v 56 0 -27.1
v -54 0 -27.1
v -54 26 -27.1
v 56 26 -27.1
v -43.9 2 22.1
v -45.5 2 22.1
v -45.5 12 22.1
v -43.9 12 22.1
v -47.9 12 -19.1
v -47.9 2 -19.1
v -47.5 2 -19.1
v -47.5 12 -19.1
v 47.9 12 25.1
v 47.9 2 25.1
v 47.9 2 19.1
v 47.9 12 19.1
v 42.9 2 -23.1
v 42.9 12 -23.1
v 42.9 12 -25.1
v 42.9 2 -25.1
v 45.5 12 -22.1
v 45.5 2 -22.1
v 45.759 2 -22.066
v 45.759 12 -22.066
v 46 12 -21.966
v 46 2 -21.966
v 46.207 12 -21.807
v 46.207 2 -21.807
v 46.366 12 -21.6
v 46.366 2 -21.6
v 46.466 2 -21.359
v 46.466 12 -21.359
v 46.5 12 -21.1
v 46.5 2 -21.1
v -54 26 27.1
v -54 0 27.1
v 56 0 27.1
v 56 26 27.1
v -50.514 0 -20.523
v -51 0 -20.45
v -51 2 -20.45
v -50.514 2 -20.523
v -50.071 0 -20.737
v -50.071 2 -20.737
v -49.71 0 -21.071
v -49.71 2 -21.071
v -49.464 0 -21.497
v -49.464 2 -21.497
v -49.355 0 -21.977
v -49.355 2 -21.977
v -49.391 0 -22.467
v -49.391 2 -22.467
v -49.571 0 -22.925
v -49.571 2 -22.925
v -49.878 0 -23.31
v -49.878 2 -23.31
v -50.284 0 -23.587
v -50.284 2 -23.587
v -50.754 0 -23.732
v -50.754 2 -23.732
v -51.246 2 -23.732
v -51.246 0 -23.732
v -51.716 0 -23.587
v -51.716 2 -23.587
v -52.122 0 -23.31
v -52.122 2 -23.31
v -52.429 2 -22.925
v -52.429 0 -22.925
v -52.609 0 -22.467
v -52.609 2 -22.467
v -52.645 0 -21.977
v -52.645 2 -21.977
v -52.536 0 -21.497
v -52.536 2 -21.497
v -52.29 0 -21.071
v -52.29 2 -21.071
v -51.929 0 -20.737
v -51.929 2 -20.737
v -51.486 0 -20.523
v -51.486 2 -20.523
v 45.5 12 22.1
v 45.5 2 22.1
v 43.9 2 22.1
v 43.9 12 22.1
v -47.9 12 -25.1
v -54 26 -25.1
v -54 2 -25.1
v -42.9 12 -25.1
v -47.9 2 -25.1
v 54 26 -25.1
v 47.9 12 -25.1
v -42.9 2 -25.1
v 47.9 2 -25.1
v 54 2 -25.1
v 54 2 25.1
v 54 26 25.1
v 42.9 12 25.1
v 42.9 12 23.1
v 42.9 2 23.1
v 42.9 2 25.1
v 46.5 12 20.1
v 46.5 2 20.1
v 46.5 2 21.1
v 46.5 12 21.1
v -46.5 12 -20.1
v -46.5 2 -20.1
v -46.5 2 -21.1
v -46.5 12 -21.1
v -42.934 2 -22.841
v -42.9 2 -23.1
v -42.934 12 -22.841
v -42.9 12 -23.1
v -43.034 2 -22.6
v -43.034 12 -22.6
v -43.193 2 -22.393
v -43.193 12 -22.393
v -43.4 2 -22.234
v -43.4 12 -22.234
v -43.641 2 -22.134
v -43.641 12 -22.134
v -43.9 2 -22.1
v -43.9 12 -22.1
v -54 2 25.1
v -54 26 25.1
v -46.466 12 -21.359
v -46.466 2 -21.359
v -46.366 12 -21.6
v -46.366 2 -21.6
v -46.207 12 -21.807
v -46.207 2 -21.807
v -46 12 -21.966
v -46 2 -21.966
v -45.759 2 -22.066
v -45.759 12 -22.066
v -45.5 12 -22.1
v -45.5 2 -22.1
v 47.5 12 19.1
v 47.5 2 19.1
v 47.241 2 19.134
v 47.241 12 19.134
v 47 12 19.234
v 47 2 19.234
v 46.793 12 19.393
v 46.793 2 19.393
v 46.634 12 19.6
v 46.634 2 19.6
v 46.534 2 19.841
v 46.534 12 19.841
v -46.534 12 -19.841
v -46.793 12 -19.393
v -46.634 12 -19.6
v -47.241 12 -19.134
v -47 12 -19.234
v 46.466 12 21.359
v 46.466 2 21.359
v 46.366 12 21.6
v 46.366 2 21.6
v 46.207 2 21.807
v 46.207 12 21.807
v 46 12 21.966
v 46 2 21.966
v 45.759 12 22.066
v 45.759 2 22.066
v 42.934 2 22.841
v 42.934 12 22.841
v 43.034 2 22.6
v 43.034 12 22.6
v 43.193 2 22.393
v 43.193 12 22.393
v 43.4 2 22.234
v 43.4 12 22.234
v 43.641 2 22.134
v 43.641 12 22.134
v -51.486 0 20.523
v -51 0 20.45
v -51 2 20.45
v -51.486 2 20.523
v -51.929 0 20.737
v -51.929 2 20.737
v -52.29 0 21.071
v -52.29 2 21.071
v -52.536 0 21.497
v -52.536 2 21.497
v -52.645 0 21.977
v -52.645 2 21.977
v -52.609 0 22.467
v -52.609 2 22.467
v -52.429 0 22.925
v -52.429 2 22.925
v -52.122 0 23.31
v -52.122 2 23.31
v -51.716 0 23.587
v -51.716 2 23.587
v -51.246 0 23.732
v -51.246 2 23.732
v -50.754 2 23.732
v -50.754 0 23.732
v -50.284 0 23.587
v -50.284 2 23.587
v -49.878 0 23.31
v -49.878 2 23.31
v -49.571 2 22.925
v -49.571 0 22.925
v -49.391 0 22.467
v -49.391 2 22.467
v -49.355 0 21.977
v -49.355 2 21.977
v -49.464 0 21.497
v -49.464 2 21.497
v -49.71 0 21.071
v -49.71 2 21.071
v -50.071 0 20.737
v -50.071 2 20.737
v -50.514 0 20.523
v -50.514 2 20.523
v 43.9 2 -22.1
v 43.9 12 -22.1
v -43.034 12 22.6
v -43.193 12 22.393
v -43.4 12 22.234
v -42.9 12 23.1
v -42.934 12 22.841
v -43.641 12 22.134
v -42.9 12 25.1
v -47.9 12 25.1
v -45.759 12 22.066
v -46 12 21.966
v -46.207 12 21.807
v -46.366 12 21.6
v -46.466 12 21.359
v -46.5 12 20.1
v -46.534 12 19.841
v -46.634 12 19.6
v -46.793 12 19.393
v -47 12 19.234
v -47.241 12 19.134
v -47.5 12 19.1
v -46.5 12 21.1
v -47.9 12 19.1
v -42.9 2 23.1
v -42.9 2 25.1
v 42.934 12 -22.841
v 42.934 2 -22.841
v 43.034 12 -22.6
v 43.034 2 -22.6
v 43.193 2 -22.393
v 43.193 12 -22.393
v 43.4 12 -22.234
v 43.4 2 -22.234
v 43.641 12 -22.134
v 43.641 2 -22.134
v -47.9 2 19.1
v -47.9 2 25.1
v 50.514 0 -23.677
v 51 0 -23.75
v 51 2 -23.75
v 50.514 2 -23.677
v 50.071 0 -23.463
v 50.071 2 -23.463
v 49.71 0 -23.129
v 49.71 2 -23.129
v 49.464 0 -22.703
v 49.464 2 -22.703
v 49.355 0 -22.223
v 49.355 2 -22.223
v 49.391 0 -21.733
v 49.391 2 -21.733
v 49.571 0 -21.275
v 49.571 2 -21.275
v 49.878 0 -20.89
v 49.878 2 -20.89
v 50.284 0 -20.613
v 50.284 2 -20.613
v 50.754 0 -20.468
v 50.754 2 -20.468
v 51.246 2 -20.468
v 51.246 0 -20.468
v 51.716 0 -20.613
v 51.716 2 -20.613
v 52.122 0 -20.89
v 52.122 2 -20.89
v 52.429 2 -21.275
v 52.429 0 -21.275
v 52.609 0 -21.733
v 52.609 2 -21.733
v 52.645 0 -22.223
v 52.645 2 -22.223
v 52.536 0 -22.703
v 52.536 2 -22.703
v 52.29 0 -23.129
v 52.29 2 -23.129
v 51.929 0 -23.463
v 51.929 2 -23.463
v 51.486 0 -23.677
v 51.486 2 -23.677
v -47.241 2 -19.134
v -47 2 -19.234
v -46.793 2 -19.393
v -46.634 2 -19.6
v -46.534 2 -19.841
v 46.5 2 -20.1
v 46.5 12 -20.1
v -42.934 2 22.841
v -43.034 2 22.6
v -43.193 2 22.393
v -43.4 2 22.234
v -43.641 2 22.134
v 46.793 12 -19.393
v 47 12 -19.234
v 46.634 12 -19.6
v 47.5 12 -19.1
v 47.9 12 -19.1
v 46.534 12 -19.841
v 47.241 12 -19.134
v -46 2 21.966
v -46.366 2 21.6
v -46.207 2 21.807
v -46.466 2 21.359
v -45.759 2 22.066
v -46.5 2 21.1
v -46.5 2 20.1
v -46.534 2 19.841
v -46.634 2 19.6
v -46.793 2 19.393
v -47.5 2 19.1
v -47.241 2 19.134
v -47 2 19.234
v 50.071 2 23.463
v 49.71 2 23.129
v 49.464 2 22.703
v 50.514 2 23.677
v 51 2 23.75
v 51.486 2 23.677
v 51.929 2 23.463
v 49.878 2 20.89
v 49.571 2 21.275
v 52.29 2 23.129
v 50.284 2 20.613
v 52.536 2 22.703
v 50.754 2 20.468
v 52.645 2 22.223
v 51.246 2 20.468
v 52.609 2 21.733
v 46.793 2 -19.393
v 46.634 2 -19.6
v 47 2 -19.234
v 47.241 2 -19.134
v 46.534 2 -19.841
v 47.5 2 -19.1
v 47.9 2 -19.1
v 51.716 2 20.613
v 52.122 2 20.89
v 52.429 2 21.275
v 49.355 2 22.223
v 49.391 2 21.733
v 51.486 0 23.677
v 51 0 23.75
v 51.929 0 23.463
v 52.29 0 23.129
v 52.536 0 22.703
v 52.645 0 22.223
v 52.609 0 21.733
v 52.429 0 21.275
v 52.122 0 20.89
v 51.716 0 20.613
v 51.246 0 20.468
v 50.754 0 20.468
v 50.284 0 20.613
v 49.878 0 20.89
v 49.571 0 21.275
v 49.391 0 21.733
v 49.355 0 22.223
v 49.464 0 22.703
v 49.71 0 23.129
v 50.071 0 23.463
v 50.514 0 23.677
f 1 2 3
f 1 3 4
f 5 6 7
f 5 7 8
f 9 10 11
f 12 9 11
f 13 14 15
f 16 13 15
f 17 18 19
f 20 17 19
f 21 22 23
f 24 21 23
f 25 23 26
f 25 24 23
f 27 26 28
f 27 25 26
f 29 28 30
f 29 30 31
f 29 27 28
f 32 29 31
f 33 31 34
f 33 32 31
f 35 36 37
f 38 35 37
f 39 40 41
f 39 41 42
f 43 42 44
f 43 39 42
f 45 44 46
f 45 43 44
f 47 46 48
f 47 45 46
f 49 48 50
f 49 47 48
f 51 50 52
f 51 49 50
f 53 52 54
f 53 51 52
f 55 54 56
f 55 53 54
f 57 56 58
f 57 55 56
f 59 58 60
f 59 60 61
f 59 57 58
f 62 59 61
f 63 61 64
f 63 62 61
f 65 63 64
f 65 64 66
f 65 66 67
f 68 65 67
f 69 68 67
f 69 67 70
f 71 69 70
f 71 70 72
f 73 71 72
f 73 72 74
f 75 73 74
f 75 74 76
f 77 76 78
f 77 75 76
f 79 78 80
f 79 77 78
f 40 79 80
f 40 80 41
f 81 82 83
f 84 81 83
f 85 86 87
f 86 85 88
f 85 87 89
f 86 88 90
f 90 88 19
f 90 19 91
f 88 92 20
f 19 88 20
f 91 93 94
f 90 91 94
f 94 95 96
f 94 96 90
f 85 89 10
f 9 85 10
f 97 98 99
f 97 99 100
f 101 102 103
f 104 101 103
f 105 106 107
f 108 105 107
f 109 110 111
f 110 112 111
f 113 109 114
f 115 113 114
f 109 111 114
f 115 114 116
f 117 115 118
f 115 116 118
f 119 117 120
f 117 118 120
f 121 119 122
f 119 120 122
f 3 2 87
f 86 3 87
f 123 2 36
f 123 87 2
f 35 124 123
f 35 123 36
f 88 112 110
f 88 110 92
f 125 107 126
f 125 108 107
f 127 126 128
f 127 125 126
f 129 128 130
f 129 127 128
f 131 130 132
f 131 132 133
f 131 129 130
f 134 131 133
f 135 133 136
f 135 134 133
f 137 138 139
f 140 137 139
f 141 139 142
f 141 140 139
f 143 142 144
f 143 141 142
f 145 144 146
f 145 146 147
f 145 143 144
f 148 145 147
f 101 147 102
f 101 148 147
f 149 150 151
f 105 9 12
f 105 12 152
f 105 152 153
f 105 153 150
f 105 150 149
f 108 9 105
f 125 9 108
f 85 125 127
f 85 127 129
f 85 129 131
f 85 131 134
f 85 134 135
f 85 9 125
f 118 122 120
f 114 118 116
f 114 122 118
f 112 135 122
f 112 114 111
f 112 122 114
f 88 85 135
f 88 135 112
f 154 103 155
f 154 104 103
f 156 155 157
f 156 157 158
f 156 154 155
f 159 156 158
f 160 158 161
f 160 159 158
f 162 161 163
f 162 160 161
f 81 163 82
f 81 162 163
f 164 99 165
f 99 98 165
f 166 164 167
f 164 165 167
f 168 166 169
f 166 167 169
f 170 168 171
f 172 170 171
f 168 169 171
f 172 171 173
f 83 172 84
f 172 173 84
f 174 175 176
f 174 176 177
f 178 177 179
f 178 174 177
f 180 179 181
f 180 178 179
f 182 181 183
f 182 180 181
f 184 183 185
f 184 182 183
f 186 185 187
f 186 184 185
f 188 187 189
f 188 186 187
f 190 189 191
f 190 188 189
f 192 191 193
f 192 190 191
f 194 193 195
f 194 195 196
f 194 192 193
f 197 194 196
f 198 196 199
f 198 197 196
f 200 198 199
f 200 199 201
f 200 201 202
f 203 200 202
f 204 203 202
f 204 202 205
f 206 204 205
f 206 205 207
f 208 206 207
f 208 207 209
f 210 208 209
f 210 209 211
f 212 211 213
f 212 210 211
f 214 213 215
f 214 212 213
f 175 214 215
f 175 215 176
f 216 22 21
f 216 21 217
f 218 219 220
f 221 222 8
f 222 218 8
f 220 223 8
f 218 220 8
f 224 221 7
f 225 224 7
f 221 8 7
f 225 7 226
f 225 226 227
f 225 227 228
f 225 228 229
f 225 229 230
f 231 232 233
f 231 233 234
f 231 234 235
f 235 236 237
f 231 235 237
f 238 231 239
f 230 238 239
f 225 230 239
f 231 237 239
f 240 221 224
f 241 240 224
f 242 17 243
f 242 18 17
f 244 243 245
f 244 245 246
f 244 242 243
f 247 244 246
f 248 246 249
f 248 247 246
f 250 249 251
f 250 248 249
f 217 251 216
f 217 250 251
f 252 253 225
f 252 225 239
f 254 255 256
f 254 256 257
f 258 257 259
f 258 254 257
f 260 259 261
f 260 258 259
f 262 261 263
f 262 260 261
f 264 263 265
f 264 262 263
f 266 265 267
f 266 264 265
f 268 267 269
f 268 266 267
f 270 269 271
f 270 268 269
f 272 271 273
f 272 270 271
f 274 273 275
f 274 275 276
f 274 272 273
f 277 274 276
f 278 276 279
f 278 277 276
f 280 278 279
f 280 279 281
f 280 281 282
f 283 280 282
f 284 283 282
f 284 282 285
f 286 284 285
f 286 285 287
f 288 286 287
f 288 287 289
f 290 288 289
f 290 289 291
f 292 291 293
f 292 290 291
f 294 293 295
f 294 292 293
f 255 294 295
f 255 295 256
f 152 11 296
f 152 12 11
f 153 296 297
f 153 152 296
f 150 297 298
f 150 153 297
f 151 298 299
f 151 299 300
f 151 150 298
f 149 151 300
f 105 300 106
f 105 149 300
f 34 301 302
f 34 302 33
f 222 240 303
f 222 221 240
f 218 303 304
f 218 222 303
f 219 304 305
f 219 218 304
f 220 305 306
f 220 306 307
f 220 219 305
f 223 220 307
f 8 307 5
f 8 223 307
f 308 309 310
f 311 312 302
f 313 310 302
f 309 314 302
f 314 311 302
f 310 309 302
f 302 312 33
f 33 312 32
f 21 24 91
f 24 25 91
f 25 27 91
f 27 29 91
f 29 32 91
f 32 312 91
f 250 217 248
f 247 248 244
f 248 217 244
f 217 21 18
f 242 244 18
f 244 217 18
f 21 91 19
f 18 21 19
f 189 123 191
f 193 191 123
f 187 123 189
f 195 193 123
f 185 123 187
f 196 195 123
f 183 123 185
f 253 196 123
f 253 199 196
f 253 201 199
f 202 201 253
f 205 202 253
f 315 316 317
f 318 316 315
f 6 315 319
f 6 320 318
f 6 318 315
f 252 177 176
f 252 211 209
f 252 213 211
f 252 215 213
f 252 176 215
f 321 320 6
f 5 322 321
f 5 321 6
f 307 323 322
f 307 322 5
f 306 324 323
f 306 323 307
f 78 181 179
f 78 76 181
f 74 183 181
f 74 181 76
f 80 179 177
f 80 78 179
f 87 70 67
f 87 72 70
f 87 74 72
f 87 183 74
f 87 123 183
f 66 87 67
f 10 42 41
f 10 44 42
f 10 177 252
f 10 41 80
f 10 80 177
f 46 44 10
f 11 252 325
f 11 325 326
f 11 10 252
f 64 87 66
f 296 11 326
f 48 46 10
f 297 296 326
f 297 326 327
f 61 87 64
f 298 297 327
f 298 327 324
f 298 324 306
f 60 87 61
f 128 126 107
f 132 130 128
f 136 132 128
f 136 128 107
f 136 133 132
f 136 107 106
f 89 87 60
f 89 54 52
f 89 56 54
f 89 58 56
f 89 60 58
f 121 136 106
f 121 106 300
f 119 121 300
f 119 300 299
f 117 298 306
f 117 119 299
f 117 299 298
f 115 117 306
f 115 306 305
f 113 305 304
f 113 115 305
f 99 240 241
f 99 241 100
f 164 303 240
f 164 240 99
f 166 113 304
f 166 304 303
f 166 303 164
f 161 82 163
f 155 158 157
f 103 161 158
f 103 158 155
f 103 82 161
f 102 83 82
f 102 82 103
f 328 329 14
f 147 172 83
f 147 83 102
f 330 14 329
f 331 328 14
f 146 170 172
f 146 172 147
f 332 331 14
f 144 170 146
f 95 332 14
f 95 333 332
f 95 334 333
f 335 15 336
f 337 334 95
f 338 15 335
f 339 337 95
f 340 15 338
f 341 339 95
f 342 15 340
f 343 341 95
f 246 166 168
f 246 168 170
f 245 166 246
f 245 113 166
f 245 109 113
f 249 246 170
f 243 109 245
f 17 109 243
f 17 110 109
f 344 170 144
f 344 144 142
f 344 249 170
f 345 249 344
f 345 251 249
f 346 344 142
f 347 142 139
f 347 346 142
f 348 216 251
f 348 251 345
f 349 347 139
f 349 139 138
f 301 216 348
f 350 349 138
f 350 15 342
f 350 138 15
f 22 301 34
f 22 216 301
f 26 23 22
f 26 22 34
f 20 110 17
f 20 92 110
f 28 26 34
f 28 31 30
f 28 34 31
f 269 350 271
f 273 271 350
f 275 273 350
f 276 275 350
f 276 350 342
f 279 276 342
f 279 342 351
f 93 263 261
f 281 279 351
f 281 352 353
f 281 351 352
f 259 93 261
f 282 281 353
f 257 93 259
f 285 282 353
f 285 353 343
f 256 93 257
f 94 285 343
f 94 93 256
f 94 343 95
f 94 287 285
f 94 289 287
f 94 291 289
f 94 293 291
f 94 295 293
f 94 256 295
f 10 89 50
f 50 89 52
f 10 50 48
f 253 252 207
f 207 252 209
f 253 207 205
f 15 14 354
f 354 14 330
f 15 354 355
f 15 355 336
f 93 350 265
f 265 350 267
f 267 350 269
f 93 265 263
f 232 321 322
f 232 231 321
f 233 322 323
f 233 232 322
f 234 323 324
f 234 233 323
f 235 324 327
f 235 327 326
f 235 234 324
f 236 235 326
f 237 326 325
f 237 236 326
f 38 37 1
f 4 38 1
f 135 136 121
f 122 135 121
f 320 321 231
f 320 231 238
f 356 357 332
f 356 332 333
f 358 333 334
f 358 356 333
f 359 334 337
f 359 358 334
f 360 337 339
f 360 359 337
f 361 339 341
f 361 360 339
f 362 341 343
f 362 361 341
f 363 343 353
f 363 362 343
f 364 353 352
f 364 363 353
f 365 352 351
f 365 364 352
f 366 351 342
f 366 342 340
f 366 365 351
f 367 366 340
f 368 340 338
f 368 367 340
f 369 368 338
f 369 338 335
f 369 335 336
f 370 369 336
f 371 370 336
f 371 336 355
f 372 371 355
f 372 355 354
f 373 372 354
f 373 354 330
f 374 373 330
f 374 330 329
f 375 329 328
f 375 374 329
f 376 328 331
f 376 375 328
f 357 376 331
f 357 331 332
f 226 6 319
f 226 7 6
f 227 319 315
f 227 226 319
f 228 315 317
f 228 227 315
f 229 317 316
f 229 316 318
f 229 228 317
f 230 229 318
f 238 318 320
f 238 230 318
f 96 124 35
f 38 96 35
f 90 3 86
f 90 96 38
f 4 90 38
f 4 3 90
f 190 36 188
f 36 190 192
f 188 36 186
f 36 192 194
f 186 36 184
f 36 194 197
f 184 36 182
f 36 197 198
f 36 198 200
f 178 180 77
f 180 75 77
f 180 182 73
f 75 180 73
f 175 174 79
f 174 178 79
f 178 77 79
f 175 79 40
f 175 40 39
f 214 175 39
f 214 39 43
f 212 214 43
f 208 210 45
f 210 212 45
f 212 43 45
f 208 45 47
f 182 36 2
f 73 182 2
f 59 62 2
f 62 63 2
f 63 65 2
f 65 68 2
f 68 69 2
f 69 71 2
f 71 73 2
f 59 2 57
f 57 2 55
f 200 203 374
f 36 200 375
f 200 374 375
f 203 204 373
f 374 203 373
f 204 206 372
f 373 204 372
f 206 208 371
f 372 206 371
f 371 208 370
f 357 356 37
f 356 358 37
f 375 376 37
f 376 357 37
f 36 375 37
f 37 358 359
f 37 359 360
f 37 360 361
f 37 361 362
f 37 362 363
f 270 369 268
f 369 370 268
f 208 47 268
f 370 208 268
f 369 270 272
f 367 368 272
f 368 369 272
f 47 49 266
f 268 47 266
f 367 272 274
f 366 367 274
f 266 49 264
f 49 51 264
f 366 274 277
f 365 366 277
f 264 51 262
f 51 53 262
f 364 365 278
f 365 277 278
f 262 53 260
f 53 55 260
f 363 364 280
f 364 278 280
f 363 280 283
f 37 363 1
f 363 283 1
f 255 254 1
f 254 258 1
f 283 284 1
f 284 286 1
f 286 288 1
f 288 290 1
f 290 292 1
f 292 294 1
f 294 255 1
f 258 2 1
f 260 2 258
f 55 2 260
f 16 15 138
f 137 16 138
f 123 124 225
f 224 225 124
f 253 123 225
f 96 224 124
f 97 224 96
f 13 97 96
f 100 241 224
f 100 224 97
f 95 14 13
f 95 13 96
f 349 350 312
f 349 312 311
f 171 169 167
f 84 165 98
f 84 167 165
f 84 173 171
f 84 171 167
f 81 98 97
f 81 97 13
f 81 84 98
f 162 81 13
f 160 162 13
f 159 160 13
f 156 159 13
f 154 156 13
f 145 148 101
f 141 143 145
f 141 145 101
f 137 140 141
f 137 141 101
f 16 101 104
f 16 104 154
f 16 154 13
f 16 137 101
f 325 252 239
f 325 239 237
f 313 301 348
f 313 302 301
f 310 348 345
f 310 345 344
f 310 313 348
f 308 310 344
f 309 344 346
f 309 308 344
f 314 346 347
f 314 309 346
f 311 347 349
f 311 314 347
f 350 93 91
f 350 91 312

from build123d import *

# Parameters (mm, degrees)
SKETCH_1_W          = 112
SKETCH_1_H          = 54.2
SKETCH_1_W_2        = 108
SKETCH_1_H_2        = 50.2
EXTRUDE_1_DEPTH     = 26
SKETCH_2_W          = 108
SKETCH_2_H          = 50.2
SKETCH_2_R          = 1.65
EXTRUDE_2_DEPTH     = 2
EXTRUDE_3_DEPTH     = 10
SKETCH_9_R          = 3.5
SKETCH_9_W          = 20
SKETCH_9_H          = 10
CUT_EXTRUDE_2_DEPTH = 2
FILLET_2_R          = 2
SKETCH_10_W         = 54.2
SKETCH_10_H         = 26
CUT_EXTRUDE_3_DEPTH = 2
FILLET_3_R          = 1


with BuildPart() as part:
    # 草图1 → 凸台-拉伸1 (new body)
    with BuildSketch(Plane(origin=(0, 0, 0), x_dir=(1, 0, 0), z_dir=(0, 1, 0))):
        Rectangle(SKETCH_1_W, SKETCH_1_H)
        Rectangle(SKETCH_1_W_2, SKETCH_1_H_2, mode=Mode.SUBTRACT)
    extrude(amount=EXTRUDE_1_DEPTH)

    # 草图2 → 凸台-拉伸2 (add)
    with BuildSketch(Plane(origin=(0, 0, 0), x_dir=(1, 0, 0), z_dir=(0, 1, 0))):
        Rectangle(SKETCH_2_W, SKETCH_2_H)
        with Locations(Location((-51, 22.1, 0), (0, 0, 270))):
            Circle(SKETCH_2_R, mode=Mode.SUBTRACT)
        with Locations(Location((51, 22.1, 0), (0, 0, 90))):
            Circle(SKETCH_2_R, mode=Mode.SUBTRACT)
        with Locations(Location((51, -22.1, 0), (0, 0, 270))):
            Circle(SKETCH_2_R, mode=Mode.SUBTRACT)
        with Locations(Location((-51, -22.1, 0), (0, 0, 90))):
            Circle(SKETCH_2_R, mode=Mode.SUBTRACT)
    extrude(amount=EXTRUDE_2_DEPTH)

    # 草图6 → 凸台-拉伸3 (add)
    with BuildSketch(Plane(origin=(0, 2, 0), x_dir=(1, 0, 0), z_dir=(0, 1, 0))):
        Polygon((-47.9, 25.1), (-47.9, 19.1), (-46.5, 19.1), (-46.5, 22.1), (-42.9, 22.1), (-42.9, 25.1), align=None)
        Polygon((46.5, 19.1), (46.5, 22.1), (42.9, 22.1), (42.9, 25.1), (47.9, 25.1), (47.9, 19.1), align=None)
        Polygon((47.9, -25.1), (47.9, -19.1), (46.5, -19.1), (46.5, -22.1), (42.9, -22.1), (42.9, -25.1), align=None)
        Polygon((-42.9, -25.1), (-47.9, -25.1), (-47.9, -19.1), (-46.5, -19.1), (-46.5, -22.1), (-42.9, -22.1), align=None)
    extrude(amount=EXTRUDE_3_DEPTH)

    # 草图9 → 切除-拉伸2 (cut)
    with BuildSketch(Plane.ZY.offset(56)):
        with Locations((-16, 6)):
            Circle(SKETCH_9_R)
        with Locations((10.1, 16)):
            Rectangle(SKETCH_9_W, SKETCH_9_H)
    extrude(amount=-CUT_EXTRUDE_2_DEPTH, mode=Mode.SUBTRACT)

    # 圆角2
    fillet_2_edges = [part.edges().sort_by_distance(p)[0] for p in [
        (-56, 16, 20.1),
        (-56, 21, 10.1),
        (-56, 16, 0.1),
        (-56, 11, 10.1),
        (-56, 6, -19.5),
    ]]
    fillet(fillet_2_edges, radius=FILLET_2_R - 0.0001)  # a hair under: the kernel refuses the full size

    # 草图10 → 切除-拉伸3 (cut)
    with BuildSketch(Plane.ZY.offset(56)):
        with Locations((0, 13)):
            Rectangle(SKETCH_10_W, SKETCH_10_H)
    extrude(amount=-CUT_EXTRUDE_3_DEPTH, mode=Mode.SUBTRACT)

    # 圆角3
    fillet_3_edges = [part.edges().sort_by_distance(p)[0] for p in [
        (-42.9, 7, 22.1),
        (-46.5, 7, 22.1),
        (-46.5, 7, 19.1),
        (-46.5, 7, -19.1),
        (-46.5, 7, -22.1),
        (-42.9, 7, -22.1),
        (42.9, 7, -22.1),
        (46.5, 7, -22.1),
        (46.5, 7, -19.1),
        (46.5, 7, 19.1),
        (46.5, 7, 22.1),
        (42.9, 7, 22.1),
    ]]
    fillet(fillet_3_edges, radius=FILLET_3_R)


solid = part.part
